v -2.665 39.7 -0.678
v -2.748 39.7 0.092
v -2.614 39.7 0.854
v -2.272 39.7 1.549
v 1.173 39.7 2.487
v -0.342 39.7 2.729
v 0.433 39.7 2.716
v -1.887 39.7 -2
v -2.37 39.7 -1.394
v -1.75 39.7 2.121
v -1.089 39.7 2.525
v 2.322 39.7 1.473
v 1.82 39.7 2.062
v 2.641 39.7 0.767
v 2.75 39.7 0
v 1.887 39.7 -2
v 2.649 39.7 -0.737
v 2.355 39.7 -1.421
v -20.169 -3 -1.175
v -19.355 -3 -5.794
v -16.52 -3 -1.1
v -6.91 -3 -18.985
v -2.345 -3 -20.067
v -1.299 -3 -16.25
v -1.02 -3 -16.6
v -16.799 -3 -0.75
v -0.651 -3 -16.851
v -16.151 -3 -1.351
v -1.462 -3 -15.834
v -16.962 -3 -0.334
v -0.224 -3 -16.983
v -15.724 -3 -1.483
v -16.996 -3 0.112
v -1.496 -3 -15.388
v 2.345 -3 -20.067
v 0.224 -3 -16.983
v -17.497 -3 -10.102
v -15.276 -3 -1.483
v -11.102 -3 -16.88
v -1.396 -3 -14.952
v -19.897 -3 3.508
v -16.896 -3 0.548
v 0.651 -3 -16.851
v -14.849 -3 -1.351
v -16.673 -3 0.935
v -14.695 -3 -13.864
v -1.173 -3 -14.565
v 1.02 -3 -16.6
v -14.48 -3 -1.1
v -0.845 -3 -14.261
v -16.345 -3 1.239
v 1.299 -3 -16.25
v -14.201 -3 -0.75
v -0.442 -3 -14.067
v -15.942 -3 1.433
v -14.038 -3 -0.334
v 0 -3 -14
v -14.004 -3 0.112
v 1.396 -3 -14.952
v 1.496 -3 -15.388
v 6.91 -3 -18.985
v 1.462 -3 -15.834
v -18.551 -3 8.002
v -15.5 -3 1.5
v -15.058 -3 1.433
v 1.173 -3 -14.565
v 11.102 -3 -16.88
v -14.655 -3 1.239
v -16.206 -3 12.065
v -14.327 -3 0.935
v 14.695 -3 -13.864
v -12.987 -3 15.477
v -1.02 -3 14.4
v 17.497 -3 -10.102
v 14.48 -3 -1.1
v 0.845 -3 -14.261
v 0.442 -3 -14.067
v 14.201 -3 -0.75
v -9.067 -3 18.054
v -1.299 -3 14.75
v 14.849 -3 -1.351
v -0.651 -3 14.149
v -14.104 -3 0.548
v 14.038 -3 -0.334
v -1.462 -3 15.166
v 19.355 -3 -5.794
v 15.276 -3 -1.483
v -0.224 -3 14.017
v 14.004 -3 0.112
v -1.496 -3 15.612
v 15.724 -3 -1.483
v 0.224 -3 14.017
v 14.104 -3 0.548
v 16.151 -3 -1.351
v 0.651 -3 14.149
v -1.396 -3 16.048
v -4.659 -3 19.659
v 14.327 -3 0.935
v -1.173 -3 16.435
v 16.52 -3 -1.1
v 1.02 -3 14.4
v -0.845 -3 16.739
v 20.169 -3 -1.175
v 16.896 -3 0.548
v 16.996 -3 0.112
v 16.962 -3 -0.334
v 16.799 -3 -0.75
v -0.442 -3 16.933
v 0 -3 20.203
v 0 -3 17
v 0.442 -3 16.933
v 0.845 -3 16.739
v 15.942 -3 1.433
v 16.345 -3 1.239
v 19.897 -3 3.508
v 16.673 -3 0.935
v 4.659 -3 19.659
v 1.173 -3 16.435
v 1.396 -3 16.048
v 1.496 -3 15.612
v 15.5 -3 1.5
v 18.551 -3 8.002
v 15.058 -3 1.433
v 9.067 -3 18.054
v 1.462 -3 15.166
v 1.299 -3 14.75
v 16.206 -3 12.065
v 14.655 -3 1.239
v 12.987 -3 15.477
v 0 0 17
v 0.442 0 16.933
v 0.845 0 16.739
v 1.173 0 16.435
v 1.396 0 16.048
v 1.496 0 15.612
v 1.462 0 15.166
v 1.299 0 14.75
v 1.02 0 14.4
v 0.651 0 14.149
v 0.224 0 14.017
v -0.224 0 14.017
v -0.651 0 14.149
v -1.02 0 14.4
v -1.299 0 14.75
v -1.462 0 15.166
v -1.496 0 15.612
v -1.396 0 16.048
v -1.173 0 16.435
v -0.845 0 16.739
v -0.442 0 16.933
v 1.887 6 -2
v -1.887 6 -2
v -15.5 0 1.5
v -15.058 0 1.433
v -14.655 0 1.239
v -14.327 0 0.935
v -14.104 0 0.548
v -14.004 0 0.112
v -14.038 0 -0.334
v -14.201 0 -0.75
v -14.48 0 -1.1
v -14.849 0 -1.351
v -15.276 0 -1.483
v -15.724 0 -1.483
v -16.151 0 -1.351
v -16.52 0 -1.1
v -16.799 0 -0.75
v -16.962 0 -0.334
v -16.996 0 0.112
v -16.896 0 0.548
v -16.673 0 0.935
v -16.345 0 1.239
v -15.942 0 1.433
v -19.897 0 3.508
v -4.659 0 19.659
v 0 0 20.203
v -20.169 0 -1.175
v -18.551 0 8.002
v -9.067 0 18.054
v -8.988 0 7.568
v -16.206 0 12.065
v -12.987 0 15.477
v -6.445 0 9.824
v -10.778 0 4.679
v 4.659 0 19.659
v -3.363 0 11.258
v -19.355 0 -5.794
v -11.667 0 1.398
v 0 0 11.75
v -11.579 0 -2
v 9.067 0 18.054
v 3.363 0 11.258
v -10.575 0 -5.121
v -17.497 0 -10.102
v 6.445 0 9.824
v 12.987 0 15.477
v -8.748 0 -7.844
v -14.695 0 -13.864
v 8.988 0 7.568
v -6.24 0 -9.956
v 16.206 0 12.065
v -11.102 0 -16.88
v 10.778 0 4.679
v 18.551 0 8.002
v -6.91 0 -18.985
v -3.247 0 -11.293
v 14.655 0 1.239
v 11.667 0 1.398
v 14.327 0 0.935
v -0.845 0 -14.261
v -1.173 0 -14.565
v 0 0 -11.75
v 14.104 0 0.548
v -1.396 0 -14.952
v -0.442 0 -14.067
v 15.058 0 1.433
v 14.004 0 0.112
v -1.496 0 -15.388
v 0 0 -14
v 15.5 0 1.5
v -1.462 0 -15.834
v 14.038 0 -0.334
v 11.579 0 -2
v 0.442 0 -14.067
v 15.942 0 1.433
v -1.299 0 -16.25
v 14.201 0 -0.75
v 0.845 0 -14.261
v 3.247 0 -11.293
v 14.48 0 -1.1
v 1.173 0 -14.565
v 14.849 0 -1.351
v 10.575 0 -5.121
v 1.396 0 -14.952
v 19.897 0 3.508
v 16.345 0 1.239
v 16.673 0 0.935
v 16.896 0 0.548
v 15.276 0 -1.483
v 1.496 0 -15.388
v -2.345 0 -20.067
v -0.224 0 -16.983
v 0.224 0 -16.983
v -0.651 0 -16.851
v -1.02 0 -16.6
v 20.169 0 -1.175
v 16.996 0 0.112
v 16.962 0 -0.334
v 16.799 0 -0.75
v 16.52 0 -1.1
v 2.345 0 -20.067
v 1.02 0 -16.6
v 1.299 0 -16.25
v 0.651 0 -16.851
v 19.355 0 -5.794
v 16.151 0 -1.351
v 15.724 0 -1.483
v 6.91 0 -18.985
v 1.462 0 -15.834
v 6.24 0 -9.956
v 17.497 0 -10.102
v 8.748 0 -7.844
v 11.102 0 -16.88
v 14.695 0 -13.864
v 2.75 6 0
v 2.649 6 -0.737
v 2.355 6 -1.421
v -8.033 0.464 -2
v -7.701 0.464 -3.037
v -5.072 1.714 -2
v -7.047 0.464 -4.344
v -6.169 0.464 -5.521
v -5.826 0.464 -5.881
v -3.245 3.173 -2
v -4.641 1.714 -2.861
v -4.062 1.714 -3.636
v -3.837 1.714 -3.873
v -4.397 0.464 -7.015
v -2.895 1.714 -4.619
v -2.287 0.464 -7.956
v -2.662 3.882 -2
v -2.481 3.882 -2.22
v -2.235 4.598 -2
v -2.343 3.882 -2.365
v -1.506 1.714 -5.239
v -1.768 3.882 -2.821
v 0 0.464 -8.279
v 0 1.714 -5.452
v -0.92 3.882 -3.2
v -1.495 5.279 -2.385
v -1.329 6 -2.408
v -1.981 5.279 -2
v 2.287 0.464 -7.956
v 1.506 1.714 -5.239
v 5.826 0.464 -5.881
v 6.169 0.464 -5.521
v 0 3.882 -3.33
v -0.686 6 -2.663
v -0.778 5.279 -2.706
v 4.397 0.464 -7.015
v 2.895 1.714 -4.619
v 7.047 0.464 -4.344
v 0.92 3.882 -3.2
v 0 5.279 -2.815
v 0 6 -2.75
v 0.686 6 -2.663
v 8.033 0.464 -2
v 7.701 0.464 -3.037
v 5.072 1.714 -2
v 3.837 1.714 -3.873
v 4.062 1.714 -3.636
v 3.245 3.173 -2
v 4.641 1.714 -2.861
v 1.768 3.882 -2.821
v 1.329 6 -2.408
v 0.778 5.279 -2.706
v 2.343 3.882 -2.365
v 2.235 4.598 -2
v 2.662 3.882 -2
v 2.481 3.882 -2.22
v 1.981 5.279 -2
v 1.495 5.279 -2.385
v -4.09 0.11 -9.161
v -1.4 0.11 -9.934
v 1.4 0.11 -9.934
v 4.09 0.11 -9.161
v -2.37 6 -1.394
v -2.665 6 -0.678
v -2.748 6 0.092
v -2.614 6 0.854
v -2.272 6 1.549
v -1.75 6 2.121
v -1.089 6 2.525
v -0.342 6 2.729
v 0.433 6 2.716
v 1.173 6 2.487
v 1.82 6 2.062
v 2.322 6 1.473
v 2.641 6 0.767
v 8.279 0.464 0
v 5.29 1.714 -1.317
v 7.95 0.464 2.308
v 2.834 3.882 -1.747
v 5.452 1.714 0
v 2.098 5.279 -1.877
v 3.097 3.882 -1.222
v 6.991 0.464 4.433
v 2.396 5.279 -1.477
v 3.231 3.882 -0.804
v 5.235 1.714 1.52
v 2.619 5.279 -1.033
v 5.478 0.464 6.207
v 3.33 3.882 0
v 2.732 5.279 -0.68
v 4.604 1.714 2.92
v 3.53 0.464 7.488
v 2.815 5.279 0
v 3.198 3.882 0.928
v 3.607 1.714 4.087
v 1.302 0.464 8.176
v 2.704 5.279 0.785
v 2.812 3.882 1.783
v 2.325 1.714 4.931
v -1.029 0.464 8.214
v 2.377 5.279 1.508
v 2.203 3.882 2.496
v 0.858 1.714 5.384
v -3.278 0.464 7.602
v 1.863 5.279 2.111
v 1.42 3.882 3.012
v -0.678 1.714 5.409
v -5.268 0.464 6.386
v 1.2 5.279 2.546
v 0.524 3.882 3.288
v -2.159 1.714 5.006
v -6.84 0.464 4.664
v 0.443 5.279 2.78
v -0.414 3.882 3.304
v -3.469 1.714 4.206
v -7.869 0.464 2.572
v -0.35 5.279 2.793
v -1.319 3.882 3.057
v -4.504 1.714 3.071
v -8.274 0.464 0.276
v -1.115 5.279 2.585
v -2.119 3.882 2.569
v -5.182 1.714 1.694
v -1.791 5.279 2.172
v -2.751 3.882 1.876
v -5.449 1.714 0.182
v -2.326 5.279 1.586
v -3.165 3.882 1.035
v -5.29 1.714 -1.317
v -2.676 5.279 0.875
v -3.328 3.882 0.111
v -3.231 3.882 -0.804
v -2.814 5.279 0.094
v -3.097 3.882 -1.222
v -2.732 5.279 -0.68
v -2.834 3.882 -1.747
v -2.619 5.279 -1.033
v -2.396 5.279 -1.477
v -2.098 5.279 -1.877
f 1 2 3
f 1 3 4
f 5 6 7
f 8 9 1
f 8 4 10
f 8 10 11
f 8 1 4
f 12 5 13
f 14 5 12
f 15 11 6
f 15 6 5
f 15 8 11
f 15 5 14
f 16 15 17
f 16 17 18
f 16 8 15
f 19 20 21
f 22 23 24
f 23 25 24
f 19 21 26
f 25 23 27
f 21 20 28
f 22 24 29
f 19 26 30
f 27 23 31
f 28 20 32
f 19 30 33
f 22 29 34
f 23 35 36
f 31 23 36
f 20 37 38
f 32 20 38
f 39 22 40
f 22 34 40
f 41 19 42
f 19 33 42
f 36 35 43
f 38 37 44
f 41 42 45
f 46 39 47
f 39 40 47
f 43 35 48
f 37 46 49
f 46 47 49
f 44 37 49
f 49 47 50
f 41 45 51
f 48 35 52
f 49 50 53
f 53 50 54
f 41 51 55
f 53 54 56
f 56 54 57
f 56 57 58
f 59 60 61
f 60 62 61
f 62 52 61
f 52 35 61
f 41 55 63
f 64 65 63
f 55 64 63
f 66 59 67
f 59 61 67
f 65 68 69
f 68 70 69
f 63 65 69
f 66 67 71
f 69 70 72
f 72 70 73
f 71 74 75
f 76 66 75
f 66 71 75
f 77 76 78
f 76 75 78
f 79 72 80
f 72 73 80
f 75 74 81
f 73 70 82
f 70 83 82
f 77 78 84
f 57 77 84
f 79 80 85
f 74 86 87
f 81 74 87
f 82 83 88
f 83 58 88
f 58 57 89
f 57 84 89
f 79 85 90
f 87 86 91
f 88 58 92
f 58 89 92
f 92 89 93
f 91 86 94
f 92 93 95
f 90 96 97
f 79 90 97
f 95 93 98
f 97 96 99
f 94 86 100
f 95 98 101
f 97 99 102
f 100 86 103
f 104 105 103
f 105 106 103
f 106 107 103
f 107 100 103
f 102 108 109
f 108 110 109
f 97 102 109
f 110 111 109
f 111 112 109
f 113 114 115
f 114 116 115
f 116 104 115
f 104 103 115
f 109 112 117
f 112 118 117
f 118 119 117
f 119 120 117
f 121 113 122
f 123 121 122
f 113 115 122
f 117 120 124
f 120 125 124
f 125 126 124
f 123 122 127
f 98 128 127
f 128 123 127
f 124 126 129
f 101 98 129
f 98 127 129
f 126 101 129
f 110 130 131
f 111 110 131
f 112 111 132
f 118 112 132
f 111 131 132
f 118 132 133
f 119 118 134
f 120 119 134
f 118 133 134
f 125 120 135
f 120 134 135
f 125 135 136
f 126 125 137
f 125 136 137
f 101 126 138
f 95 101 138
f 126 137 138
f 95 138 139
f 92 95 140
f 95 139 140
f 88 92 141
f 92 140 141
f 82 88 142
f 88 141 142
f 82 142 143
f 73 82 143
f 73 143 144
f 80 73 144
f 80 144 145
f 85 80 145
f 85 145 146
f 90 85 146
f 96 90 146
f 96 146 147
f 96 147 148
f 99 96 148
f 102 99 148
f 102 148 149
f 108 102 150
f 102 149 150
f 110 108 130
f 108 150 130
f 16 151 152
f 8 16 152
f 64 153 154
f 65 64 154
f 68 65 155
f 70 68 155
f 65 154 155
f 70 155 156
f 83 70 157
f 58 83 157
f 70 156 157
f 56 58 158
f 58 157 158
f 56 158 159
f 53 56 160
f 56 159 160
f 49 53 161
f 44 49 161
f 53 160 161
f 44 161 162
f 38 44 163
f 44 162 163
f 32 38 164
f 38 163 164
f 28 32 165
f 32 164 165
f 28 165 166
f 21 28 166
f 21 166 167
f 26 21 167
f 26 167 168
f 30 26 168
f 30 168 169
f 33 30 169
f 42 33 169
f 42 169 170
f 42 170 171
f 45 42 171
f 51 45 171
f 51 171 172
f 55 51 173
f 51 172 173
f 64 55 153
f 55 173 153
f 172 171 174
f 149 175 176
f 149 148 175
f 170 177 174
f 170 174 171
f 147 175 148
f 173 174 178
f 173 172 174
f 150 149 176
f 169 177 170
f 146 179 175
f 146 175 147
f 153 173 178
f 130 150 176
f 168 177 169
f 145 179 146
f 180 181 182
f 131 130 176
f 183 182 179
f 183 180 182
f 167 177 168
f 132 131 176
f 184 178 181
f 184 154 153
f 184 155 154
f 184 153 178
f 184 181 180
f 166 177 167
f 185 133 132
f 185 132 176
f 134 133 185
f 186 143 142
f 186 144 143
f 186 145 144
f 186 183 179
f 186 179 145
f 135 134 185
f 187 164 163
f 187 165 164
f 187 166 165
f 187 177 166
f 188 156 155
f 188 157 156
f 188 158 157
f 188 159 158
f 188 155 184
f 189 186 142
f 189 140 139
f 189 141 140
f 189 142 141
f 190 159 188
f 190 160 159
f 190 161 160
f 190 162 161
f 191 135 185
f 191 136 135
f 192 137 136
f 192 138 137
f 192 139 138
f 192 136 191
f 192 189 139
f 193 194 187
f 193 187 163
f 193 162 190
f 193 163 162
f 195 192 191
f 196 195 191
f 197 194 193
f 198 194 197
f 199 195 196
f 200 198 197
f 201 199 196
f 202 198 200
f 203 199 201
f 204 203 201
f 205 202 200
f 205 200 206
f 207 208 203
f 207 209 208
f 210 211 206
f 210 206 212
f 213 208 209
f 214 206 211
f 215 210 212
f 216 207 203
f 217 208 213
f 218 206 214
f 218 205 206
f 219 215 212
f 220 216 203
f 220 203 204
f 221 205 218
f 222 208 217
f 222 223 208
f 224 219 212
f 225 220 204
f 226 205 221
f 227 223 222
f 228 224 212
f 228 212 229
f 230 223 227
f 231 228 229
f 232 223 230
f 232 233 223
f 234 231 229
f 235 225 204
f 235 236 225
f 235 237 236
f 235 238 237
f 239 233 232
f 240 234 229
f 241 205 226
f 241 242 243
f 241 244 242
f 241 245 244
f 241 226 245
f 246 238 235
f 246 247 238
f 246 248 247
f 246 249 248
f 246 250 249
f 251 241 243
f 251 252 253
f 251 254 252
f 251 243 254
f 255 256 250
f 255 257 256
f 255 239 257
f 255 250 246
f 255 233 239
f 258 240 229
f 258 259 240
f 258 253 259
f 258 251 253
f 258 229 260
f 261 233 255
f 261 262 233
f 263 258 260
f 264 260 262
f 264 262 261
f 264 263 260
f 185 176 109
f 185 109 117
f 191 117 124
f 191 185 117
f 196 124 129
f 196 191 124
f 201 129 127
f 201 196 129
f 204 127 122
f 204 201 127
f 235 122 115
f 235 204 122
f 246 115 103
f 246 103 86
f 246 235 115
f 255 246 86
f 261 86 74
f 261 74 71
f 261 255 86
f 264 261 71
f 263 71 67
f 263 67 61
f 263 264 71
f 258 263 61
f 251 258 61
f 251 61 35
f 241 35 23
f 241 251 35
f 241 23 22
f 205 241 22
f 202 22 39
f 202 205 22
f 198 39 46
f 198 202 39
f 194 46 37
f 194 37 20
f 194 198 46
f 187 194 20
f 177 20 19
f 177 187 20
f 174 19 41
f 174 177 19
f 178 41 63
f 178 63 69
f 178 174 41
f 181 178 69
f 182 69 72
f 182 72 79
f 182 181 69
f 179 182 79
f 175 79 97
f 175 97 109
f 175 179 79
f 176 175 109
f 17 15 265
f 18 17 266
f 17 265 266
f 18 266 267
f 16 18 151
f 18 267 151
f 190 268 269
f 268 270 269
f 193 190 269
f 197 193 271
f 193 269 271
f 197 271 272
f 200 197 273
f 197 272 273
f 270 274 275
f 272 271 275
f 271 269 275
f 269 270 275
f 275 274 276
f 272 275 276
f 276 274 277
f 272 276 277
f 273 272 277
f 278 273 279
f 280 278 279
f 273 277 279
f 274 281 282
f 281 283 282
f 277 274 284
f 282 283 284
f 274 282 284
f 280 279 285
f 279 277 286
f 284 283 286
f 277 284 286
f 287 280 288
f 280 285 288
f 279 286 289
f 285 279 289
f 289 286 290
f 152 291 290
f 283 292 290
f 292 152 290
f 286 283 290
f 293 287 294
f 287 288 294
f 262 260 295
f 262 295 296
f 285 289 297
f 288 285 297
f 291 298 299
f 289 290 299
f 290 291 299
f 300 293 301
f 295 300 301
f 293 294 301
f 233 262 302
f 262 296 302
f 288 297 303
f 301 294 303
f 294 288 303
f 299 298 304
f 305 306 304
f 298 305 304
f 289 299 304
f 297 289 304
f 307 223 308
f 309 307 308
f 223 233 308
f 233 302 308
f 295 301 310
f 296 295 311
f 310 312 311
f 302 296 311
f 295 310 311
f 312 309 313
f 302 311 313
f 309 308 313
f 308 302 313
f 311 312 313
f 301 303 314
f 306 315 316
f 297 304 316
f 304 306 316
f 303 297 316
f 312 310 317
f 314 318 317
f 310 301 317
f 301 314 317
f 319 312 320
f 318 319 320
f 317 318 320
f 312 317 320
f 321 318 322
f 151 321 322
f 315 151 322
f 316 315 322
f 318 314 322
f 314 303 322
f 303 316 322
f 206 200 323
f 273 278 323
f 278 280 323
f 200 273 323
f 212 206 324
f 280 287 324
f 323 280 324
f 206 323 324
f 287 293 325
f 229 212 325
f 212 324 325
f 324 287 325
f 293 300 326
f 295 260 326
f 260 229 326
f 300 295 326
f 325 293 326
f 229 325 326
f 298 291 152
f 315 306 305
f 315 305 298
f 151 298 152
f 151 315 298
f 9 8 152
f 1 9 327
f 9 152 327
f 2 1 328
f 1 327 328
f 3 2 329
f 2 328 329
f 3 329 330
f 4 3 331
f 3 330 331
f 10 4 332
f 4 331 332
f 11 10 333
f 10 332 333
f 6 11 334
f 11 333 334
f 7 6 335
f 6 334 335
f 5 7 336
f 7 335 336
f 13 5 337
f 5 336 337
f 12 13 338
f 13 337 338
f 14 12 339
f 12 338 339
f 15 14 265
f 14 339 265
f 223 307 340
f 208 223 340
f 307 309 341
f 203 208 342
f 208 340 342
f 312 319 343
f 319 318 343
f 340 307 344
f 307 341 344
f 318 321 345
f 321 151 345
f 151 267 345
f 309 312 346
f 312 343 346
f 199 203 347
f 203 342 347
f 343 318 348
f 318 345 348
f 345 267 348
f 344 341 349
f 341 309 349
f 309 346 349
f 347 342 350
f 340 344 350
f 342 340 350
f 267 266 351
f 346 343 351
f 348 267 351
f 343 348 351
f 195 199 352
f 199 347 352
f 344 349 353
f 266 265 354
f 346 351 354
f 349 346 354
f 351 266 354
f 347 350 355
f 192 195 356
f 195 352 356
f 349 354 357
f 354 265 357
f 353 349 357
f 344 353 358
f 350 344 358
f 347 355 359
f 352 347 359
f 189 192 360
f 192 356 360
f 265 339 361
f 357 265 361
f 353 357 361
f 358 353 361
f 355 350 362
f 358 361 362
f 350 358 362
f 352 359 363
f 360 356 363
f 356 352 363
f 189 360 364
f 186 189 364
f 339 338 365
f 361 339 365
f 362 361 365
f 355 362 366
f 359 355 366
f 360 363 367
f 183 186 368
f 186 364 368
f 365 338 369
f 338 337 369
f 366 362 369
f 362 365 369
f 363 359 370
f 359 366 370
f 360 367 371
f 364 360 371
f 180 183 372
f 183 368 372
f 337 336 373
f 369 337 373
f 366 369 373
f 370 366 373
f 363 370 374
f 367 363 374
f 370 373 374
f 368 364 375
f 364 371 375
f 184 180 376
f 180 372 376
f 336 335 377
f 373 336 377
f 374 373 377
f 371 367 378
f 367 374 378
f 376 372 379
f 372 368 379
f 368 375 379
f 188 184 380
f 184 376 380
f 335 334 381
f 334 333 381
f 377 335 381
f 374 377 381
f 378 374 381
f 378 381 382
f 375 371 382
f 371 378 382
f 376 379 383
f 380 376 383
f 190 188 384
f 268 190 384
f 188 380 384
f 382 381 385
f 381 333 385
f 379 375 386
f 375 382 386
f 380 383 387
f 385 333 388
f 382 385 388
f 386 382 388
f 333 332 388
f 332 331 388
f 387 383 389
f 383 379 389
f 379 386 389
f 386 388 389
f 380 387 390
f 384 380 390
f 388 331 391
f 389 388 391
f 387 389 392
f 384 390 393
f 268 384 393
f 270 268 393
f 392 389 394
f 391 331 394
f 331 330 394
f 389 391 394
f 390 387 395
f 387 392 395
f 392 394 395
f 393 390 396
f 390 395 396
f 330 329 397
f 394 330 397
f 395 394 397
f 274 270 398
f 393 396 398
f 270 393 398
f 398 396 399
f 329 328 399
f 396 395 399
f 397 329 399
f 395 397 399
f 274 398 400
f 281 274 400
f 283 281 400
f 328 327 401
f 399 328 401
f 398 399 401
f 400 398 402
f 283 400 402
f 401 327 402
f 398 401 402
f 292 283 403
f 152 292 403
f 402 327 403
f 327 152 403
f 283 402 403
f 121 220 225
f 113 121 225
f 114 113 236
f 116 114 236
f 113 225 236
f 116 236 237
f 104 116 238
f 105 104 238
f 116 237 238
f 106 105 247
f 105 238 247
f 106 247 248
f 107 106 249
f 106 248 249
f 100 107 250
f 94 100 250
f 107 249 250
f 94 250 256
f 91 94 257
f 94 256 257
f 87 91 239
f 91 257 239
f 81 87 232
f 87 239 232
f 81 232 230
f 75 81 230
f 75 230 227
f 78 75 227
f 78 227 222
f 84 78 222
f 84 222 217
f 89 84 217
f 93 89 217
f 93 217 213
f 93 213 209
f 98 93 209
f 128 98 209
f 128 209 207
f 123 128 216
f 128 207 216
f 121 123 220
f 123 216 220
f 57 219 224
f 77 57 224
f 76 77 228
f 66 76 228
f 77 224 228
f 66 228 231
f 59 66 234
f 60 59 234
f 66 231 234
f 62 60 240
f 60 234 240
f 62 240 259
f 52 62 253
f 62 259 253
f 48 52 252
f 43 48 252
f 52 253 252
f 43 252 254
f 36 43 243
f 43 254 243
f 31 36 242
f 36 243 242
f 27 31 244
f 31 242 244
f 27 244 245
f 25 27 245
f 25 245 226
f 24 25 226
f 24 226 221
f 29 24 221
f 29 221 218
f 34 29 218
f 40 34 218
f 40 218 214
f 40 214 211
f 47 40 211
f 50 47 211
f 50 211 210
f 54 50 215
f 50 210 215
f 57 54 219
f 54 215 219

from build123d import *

# Parameters (mm, degrees)
SKETCH2_R           = 20.203446649
SKETCH2_R_2         = 1.5
SKETCH2_R_3         = 2.75
BOSS_EXTRUDE1_DEPTH = 3
BOSS_EXTRUDE2_DEPTH = 39.7
BOSS_EXTRUDE3_DEPTH = 6
FILLET1_SIZE        = 9
FILLET1_SIZE_2      = 6


with BuildPart() as part:
    # Sketch2 → Boss-Extrude1 (new body)
    # profile 1 of 5: a face of its own
    with BuildSketch(Plane(origin=(0, 0, 0), x_dir=(1, 0, 0), z_dir=(0, 1, 0))):
        with Locations(Location((0, 0, 0), (0, 0, 270))):
            Circle(SKETCH2_R)
        with Locations(Location((0, 15.5, 0), (0, 0, 270))):
            Circle(SKETCH2_R_2, mode=Mode.SUBTRACT)
        with Locations(Location((-15.5, 0, 0), (0, 0, 270))):
            Circle(SKETCH2_R_2, mode=Mode.SUBTRACT)
        with Locations(Location((0, -15.5, 0), (0, 0, 270))):
            Circle(SKETCH2_R_2, mode=Mode.SUBTRACT)
        with Locations(Location((15.5, 0, 0), (0, 0, 270))):
            Circle(SKETCH2_R_2, mode=Mode.SUBTRACT)
        Circle(SKETCH2_R_3, mode=Mode.SUBTRACT)
    # profile 2 of 5: a face of its own
    with BuildSketch(Plane(origin=(0, 0, 0), x_dir=(1, 0, 0), z_dir=(0, 1, 0))):
        with BuildLine():
            ThreePointArc((1.887458609, 2), (0, 2.75), (-1.887458609, 2))
            Line((-1.887458609, 2), (1.887458609, 2))
        make_face()
    # profile 3 of 5: a face of its own
    with BuildSketch(Plane(origin=(0, 0, 0), x_dir=(1, 0, 0), z_dir=(0, 1, 0))):
        with BuildLine():
            Line((1.887458609, 2), (-1.887458609, 2))
            ThreePointArc((-1.887458609, 2), (-1.089033706, -2.525174368), (2.75, 0))
            ThreePointArc((2.75, 0), (2.525174368, 1.089033706), (1.887458609, 2))
        make_face()
    # profile 4 of 5: a face of its own
    with BuildSketch(Plane(origin=(0, 0, 0), x_dir=(1, 0, 0), z_dir=(0, 1, 0))):
        with BuildLine():
            ThreePointArc((1.887458609, 2), (0, 2.75), (-1.887458609, 2))
            Line((-1.887458609, 2), (1.887458609, 2))
        make_face()
    # profile 5 of 5: a face of its own
    with BuildSketch(Plane(origin=(0, 0, 0), x_dir=(1, 0, 0), z_dir=(0, 1, 0))):
        with BuildLine():
            Line((1.887458609, 2), (-1.887458609, 2))
            ThreePointArc((-1.887458609, 2), (-1.089033706, -2.525174368), (2.75, 0))
            ThreePointArc((2.75, 0), (2.525174368, 1.089033706), (1.887458609, 2))
        make_face()
    extrude(amount=-BOSS_EXTRUDE1_DEPTH)

    # Sketch2<3> → Boss-Extrude2 (add)
    with BuildSketch(Plane(origin=(0, 0, 0), x_dir=(1, 0, 0), z_dir=(0, 1, 0))):
        with BuildLine():
            Line((1.887458609, 2), (-1.887458609, 2))
            ThreePointArc((-1.887458609, 2), (-1.089033706, -2.525174368), (2.75, 0))
            ThreePointArc((2.75, 0), (2.525174368, 1.089033706), (1.887458609, 2))
        make_face()
    extrude(amount=BOSS_EXTRUDE2_DEPTH)

    # Sketch2<4> → Boss-Extrude3 (add)
    with BuildSketch(Plane(origin=(0, 0, 0), x_dir=(1, 0, 0), z_dir=(0, 1, 0))):
        with BuildLine():
            ThreePointArc((1.887458609, 2), (0, 2.75), (-1.887458609, 2))
            Line((-1.887458609, 2), (1.887458609, 2))
        make_face()
        with BuildLine():
            Line((1.887458609, 2), (-1.887458609, 2))
            ThreePointArc((-1.887458609, 2), (-1.089033706, -2.525174368), (2.75, 0))
            ThreePointArc((2.75, 0), (2.525174368, 1.089033706), (1.887458609, 2))
        make_face()
    extrude(amount=BOSS_EXTRUDE3_DEPTH)

    # Fillet1
    # an asymmetric fillet: 9, 6 mm, written as the material it adds along each edge
    with BuildSketch(Plane(origin=(0, 0, 0), x_dir=(0.6863485850246134, 0, -0.7272727272727275), z_dir=(-0.7272727272727275, 0, -0.6863485850246134))) as fillet1_piece_1_section:
        with BuildLine():
            Bezier((2.75 + FILLET1_SIZE, 0), (2.75, 0), (2.75, -FILLET1_SIZE_2), weights=[1, 0.707106781, 1])
            Line((2.75, -FILLET1_SIZE_2), (2.75, 0))
            Line((2.75, 0), (2.75 + FILLET1_SIZE, 0))
        make_face()
    fillet1_piece_1 = revolve(axis=Axis((0, 0, 0), (0, -1, 0)), mode=Mode.PRIVATE)
    fillet1_piece_1 = split(fillet1_piece_1, bisect_by=Plane(origin=(2.77e-07, 0.848868766, -2), z_dir=(0, 0, -1)), keep=Keep.TOP, mode=Mode.PRIVATE)
    add(fillet1_piece_1)
    with BuildSketch(Plane(origin=(0, 0, 0), x_dir=(0.6863485850246134, 0, -0.7272727272727275), z_dir=(-0.7272727272727275, 0, -0.6863485850246134))) as fillet1_piece_2_section:
        with BuildLine():
            Bezier((2.75 + FILLET1_SIZE, 0), (2.75, 0), (2.75, -FILLET1_SIZE_2), weights=[1, 0.707106781, 1])
            Line((2.75, -FILLET1_SIZE_2), (2.75, 0))
            Line((2.75, 0), (2.75 + FILLET1_SIZE, 0))
        make_face()
    fillet1_piece_2 = revolve(axis=Axis((0, 0, 0), (0, -1, 0)), mode=Mode.PRIVATE)
    fillet1_piece_2 = split(fillet1_piece_2, bisect_by=Plane(origin=(-3.3e-08, 1.056267752, -2), z_dir=(0, 0, 1)), keep=Keep.TOP, mode=Mode.PRIVATE)
    add(fillet1_piece_2)


solid = part.part
